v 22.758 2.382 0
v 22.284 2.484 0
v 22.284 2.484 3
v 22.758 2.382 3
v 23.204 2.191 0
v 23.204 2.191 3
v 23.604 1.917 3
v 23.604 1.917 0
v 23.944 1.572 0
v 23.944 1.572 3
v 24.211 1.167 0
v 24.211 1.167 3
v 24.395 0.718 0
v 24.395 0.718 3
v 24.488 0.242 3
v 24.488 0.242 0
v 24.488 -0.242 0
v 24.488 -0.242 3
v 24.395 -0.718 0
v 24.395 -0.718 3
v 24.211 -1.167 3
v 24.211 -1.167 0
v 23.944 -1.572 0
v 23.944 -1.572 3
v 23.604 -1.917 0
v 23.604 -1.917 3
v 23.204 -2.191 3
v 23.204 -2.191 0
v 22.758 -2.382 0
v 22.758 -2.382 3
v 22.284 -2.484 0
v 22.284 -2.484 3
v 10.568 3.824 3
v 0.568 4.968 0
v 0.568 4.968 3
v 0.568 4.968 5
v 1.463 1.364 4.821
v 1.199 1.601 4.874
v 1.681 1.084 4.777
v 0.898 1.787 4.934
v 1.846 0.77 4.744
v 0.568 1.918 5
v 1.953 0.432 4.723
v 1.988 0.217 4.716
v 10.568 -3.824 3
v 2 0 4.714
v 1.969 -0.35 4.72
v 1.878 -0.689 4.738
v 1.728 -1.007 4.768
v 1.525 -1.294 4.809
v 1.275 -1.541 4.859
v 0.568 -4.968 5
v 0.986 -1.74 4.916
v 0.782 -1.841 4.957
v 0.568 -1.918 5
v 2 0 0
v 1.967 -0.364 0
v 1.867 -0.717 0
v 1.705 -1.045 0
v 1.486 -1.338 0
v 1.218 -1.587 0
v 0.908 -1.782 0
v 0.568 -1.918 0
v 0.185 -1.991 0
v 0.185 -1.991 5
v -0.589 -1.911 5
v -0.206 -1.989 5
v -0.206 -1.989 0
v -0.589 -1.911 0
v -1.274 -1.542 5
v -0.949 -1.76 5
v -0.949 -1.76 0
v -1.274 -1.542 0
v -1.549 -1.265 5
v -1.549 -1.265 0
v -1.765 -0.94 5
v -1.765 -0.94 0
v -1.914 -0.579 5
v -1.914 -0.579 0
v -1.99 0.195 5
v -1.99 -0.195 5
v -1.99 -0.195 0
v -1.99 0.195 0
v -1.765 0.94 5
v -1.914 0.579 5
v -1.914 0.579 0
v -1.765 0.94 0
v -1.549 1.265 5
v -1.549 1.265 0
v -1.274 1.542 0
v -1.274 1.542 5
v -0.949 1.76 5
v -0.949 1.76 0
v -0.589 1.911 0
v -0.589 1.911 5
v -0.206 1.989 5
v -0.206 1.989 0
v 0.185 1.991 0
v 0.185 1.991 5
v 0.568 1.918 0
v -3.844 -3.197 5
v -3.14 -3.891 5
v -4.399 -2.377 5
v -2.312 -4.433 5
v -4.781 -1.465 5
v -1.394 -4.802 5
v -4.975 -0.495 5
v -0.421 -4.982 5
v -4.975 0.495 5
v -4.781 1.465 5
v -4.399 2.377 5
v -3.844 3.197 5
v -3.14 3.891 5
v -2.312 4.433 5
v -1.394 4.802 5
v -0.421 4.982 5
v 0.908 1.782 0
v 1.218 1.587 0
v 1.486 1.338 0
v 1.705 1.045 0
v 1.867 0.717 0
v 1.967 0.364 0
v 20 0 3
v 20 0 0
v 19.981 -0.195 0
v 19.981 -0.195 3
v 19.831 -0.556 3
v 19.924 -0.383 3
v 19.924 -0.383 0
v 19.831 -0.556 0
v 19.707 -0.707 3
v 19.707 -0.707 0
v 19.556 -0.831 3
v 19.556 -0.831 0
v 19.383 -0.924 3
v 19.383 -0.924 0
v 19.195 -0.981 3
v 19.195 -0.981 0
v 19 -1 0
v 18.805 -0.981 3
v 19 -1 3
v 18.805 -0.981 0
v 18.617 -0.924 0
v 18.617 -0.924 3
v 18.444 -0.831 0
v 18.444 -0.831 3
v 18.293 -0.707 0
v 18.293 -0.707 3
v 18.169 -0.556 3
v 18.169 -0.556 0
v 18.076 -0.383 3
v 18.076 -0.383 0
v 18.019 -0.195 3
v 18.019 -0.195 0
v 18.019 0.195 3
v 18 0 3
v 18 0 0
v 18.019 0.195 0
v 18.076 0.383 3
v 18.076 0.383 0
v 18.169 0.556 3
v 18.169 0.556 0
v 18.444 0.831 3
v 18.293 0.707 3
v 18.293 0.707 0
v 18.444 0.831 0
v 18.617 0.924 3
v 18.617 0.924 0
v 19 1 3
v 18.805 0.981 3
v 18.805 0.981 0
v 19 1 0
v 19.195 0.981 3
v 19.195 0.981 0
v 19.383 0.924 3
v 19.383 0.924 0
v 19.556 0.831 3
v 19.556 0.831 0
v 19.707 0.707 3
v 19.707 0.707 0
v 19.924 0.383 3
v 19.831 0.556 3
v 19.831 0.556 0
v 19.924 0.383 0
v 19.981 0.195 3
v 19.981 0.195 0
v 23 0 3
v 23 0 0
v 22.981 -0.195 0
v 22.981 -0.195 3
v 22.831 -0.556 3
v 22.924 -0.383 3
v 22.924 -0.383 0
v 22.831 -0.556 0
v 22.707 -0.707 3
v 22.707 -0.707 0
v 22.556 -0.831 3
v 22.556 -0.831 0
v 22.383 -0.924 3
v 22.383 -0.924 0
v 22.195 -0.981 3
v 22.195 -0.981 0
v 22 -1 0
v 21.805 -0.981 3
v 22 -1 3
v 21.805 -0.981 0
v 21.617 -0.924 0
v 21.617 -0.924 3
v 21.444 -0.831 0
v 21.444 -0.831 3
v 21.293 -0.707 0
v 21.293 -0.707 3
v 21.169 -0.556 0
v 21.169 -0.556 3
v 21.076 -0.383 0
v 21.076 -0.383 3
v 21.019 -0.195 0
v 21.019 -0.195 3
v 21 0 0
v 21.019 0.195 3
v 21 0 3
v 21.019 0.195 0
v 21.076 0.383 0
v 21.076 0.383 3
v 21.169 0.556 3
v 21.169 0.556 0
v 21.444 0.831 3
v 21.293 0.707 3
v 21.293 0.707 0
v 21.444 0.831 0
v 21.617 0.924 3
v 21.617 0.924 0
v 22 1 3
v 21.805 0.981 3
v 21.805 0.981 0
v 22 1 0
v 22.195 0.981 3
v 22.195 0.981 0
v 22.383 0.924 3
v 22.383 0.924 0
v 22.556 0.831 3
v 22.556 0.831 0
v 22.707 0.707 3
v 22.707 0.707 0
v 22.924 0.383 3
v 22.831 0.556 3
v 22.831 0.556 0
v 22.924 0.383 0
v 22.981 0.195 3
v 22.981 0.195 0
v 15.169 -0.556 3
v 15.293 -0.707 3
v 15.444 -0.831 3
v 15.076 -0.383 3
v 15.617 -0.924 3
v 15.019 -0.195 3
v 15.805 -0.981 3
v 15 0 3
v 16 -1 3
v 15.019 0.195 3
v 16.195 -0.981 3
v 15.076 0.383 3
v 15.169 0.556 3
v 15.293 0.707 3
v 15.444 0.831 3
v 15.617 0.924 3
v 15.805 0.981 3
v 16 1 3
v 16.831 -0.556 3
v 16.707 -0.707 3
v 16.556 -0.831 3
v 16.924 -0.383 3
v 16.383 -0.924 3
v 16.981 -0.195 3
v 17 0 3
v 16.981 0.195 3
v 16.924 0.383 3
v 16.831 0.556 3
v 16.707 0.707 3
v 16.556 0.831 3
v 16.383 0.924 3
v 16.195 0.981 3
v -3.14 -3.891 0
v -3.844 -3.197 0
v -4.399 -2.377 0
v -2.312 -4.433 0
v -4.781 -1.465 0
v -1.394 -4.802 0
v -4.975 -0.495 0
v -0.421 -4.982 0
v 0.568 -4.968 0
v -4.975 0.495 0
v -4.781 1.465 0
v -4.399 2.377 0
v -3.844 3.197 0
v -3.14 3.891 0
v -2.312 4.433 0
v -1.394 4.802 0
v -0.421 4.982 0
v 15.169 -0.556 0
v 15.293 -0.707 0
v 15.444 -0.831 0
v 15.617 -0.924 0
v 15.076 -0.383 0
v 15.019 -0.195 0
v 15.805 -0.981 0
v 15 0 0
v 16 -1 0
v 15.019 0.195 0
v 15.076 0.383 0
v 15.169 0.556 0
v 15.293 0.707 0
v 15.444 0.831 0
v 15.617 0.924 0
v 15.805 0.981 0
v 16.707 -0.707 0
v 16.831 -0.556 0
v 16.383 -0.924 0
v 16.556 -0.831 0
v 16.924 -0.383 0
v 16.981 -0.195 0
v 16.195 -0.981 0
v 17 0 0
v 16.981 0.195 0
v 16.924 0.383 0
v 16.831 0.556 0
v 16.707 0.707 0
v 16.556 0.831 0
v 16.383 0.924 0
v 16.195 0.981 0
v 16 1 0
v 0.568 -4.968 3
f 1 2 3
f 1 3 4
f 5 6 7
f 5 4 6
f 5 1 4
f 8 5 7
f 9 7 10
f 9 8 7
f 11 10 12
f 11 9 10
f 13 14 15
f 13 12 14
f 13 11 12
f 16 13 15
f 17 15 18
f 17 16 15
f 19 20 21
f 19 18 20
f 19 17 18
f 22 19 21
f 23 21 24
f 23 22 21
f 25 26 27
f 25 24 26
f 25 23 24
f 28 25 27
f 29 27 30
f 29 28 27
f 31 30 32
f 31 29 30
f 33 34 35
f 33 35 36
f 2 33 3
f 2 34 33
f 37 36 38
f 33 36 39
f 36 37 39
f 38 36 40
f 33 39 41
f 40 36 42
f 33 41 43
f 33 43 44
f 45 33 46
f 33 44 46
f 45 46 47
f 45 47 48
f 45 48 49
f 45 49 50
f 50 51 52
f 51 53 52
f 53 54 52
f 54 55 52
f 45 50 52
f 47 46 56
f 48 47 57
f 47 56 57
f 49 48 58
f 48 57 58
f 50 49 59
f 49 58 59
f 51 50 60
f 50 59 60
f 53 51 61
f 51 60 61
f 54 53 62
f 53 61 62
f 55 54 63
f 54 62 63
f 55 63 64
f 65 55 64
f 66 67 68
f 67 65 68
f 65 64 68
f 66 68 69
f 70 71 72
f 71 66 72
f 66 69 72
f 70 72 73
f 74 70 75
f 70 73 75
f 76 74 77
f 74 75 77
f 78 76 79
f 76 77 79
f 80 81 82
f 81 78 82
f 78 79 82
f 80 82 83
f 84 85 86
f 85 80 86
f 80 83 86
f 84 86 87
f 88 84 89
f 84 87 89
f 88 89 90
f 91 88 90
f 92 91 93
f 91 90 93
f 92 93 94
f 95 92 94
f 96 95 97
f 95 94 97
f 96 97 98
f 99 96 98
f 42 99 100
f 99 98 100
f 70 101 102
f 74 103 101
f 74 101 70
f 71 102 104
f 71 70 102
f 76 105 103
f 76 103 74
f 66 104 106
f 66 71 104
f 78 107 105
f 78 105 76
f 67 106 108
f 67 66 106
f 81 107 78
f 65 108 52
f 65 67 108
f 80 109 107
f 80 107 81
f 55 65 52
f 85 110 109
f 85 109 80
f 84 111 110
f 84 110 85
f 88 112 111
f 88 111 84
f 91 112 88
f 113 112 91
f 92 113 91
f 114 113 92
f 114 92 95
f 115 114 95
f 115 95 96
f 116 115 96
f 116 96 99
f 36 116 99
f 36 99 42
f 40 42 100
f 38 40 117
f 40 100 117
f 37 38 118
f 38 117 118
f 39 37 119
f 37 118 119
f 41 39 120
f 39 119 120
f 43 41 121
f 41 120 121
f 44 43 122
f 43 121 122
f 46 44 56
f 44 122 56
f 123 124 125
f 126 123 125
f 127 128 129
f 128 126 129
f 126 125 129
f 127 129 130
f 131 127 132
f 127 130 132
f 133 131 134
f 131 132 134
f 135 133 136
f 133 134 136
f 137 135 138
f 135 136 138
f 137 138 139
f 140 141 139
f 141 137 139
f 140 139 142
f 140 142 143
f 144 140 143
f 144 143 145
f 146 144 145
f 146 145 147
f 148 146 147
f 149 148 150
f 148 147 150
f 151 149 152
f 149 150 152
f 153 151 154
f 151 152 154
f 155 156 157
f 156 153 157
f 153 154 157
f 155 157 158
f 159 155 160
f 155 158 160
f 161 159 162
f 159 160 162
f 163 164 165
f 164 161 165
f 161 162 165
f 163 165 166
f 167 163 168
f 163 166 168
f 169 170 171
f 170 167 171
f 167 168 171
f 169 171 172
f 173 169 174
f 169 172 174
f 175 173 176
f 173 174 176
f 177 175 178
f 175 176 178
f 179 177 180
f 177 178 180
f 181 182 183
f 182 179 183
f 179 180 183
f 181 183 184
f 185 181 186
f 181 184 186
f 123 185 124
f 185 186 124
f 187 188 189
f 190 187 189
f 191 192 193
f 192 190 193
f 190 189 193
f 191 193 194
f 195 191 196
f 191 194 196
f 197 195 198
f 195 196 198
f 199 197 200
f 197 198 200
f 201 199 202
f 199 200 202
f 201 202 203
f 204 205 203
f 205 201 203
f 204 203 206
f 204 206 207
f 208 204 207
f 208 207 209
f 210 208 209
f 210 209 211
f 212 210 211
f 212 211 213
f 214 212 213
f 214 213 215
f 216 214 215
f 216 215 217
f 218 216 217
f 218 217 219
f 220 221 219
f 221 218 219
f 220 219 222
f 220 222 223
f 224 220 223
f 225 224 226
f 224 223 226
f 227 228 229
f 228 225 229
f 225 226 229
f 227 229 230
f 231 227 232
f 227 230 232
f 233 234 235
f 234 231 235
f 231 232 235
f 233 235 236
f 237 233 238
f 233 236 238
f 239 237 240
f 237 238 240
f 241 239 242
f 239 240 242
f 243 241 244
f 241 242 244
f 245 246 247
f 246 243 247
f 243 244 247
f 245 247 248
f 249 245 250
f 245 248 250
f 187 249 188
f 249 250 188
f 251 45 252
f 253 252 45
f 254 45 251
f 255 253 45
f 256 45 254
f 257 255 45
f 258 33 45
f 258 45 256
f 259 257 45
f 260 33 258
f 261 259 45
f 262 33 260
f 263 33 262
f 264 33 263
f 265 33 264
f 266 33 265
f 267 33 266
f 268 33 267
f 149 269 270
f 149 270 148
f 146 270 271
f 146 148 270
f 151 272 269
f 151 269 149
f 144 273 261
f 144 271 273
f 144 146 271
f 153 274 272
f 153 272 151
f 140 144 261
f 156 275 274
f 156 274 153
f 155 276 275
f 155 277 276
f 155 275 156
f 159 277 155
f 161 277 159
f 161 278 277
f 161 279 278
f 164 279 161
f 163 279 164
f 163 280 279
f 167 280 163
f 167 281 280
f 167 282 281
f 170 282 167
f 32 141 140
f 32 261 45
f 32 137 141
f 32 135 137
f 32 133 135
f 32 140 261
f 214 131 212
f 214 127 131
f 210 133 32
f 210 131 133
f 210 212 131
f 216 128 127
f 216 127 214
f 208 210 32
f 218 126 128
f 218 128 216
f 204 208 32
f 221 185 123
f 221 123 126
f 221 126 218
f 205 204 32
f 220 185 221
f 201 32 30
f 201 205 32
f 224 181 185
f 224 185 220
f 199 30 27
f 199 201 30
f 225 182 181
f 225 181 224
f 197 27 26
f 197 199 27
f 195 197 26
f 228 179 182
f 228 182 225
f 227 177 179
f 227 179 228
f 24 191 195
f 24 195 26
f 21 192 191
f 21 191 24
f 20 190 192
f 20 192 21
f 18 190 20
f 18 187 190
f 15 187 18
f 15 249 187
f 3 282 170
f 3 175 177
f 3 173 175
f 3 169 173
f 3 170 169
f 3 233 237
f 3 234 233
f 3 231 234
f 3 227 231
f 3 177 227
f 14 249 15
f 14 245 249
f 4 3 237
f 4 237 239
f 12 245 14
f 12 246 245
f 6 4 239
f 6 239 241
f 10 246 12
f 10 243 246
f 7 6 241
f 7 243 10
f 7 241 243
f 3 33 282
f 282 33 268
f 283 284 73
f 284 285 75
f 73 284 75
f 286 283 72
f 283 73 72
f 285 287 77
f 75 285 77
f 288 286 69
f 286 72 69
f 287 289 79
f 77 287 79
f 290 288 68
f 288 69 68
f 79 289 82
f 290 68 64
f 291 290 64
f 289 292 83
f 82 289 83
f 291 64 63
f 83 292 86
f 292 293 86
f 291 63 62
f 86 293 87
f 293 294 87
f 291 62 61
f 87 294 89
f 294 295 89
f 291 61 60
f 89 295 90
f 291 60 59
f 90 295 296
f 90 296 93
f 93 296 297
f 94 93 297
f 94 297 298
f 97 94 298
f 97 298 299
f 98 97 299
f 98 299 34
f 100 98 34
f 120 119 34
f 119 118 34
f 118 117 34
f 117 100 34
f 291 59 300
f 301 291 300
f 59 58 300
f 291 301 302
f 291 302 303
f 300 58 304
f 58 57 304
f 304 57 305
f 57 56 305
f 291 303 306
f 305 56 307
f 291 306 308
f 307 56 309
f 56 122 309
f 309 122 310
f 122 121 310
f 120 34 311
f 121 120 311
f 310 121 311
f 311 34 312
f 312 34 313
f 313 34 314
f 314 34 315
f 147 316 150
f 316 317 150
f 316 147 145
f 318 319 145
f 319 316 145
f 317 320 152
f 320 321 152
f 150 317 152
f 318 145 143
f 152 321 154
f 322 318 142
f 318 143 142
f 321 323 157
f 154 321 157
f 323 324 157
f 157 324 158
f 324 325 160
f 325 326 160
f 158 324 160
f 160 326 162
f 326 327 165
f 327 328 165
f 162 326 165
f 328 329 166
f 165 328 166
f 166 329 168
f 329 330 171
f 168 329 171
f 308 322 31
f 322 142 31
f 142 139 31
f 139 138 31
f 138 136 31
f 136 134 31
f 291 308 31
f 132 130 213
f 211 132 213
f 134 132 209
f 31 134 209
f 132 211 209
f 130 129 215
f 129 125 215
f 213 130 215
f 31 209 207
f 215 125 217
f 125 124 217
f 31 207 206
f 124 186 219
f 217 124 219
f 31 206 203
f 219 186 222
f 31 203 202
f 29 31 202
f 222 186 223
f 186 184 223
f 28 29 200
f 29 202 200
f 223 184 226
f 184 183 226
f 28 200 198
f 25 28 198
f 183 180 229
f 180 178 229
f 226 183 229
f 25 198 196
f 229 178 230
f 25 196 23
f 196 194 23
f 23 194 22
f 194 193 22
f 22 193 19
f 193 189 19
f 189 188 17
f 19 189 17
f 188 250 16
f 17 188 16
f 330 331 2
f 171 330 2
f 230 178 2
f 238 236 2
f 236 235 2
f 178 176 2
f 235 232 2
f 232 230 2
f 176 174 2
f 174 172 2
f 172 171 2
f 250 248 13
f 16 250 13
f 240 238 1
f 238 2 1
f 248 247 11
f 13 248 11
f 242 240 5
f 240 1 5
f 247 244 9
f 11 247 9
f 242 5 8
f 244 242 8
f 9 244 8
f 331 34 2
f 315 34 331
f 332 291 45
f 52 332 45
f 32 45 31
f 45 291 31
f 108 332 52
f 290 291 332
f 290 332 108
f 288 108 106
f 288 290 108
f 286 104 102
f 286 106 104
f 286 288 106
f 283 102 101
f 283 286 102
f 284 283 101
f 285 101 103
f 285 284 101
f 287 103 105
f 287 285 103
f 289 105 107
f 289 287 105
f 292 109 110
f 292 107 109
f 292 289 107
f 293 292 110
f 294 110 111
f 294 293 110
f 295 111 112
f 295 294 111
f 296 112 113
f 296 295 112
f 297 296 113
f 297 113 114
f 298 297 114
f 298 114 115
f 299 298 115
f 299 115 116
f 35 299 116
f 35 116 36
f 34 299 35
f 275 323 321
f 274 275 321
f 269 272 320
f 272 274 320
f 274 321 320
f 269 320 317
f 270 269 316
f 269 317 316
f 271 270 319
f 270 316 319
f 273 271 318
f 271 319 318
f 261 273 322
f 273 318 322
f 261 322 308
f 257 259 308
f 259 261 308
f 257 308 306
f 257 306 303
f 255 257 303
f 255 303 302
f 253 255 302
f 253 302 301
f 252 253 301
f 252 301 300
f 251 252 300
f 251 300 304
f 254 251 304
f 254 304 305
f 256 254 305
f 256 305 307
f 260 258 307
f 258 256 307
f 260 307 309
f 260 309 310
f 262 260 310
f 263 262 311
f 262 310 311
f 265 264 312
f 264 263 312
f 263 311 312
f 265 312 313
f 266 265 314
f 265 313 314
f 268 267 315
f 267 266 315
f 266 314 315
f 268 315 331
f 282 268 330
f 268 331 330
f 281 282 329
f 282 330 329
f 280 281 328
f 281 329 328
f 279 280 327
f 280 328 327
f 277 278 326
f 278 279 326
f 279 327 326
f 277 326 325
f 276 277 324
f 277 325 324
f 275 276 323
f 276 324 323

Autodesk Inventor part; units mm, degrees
ref_plane "YZ Plane" through (0, 0, 0) normal (1, 0, 0) x (0, 1, 0)
ref_plane "XZ Plane" through (0, 0, 0) normal (0, 1, 0) x (-1, 0, 0)
ref_plane "XY Plane" through (0, 0, 0) normal (0, 0, 1) x (1, 0, 0)
sketch "Skizze1" plane through (0, 0, 0) normal (0, 0, 1) x (1, 0, 0)
  line L0 (0, 7) -> (0, -7) construction
  line L1 (-10.9, 0) -> (30.4, 0) construction
  circle A0 centre (0, 0) radius 2
  circle A1 centre (16, 0) radius 1
  circle A2 centre (19, 0) radius 1
  circle A3 centre (22, 0) radius 1
  arc A4 (22.2841, -2.4838) -> (22.2841, 2.4838) centre (22, 0) ccw
  arc A5 (0.5682, 4.9676) -> (0.5682, -4.9676) centre (0, 0) ccw
  line L2 (0.5682, 4.9676) -> (22.2841, 2.4838)
  line L3 (0.5682, -4.9676) -> (22.2841, -2.4838)
  line L4 (0.5682, -4.9676) -> (0.5682, -1.9176)
  line L5 (0.5682, 1.9176) -> (0.5682, 4.9676)
  line L6 (0.5682, 1.9176) -> (0.5682, -1.9176)
  dimension "d1" = 19
  dimension "d2" = 22
  dimension "d3" = 5
  dimension "d4" = 2
  dimension "d5" = 4
  dimension "d6" = 10
  dimension "d16" = 16
extrude "Extrusion1" add sketch "Skizze1" along normal blind 3
extrude "Extrusion2" add sketch "Skizze1" along normal blind 5 contours L6 A0 | A0 L4 A5 L5 picked at (-0.8876, -0.1748)
chamfer "Fase1" distance 10 distance2 2 1 edges at (0.5682, 0, 3) measured on face at (5.3788, 0, 3)
extrude "Extrusion3" cut sketch "Skizze1" along normal blind 5 contours A0 L6 | L6 A0
properties part number "ServoArm 22mm"
